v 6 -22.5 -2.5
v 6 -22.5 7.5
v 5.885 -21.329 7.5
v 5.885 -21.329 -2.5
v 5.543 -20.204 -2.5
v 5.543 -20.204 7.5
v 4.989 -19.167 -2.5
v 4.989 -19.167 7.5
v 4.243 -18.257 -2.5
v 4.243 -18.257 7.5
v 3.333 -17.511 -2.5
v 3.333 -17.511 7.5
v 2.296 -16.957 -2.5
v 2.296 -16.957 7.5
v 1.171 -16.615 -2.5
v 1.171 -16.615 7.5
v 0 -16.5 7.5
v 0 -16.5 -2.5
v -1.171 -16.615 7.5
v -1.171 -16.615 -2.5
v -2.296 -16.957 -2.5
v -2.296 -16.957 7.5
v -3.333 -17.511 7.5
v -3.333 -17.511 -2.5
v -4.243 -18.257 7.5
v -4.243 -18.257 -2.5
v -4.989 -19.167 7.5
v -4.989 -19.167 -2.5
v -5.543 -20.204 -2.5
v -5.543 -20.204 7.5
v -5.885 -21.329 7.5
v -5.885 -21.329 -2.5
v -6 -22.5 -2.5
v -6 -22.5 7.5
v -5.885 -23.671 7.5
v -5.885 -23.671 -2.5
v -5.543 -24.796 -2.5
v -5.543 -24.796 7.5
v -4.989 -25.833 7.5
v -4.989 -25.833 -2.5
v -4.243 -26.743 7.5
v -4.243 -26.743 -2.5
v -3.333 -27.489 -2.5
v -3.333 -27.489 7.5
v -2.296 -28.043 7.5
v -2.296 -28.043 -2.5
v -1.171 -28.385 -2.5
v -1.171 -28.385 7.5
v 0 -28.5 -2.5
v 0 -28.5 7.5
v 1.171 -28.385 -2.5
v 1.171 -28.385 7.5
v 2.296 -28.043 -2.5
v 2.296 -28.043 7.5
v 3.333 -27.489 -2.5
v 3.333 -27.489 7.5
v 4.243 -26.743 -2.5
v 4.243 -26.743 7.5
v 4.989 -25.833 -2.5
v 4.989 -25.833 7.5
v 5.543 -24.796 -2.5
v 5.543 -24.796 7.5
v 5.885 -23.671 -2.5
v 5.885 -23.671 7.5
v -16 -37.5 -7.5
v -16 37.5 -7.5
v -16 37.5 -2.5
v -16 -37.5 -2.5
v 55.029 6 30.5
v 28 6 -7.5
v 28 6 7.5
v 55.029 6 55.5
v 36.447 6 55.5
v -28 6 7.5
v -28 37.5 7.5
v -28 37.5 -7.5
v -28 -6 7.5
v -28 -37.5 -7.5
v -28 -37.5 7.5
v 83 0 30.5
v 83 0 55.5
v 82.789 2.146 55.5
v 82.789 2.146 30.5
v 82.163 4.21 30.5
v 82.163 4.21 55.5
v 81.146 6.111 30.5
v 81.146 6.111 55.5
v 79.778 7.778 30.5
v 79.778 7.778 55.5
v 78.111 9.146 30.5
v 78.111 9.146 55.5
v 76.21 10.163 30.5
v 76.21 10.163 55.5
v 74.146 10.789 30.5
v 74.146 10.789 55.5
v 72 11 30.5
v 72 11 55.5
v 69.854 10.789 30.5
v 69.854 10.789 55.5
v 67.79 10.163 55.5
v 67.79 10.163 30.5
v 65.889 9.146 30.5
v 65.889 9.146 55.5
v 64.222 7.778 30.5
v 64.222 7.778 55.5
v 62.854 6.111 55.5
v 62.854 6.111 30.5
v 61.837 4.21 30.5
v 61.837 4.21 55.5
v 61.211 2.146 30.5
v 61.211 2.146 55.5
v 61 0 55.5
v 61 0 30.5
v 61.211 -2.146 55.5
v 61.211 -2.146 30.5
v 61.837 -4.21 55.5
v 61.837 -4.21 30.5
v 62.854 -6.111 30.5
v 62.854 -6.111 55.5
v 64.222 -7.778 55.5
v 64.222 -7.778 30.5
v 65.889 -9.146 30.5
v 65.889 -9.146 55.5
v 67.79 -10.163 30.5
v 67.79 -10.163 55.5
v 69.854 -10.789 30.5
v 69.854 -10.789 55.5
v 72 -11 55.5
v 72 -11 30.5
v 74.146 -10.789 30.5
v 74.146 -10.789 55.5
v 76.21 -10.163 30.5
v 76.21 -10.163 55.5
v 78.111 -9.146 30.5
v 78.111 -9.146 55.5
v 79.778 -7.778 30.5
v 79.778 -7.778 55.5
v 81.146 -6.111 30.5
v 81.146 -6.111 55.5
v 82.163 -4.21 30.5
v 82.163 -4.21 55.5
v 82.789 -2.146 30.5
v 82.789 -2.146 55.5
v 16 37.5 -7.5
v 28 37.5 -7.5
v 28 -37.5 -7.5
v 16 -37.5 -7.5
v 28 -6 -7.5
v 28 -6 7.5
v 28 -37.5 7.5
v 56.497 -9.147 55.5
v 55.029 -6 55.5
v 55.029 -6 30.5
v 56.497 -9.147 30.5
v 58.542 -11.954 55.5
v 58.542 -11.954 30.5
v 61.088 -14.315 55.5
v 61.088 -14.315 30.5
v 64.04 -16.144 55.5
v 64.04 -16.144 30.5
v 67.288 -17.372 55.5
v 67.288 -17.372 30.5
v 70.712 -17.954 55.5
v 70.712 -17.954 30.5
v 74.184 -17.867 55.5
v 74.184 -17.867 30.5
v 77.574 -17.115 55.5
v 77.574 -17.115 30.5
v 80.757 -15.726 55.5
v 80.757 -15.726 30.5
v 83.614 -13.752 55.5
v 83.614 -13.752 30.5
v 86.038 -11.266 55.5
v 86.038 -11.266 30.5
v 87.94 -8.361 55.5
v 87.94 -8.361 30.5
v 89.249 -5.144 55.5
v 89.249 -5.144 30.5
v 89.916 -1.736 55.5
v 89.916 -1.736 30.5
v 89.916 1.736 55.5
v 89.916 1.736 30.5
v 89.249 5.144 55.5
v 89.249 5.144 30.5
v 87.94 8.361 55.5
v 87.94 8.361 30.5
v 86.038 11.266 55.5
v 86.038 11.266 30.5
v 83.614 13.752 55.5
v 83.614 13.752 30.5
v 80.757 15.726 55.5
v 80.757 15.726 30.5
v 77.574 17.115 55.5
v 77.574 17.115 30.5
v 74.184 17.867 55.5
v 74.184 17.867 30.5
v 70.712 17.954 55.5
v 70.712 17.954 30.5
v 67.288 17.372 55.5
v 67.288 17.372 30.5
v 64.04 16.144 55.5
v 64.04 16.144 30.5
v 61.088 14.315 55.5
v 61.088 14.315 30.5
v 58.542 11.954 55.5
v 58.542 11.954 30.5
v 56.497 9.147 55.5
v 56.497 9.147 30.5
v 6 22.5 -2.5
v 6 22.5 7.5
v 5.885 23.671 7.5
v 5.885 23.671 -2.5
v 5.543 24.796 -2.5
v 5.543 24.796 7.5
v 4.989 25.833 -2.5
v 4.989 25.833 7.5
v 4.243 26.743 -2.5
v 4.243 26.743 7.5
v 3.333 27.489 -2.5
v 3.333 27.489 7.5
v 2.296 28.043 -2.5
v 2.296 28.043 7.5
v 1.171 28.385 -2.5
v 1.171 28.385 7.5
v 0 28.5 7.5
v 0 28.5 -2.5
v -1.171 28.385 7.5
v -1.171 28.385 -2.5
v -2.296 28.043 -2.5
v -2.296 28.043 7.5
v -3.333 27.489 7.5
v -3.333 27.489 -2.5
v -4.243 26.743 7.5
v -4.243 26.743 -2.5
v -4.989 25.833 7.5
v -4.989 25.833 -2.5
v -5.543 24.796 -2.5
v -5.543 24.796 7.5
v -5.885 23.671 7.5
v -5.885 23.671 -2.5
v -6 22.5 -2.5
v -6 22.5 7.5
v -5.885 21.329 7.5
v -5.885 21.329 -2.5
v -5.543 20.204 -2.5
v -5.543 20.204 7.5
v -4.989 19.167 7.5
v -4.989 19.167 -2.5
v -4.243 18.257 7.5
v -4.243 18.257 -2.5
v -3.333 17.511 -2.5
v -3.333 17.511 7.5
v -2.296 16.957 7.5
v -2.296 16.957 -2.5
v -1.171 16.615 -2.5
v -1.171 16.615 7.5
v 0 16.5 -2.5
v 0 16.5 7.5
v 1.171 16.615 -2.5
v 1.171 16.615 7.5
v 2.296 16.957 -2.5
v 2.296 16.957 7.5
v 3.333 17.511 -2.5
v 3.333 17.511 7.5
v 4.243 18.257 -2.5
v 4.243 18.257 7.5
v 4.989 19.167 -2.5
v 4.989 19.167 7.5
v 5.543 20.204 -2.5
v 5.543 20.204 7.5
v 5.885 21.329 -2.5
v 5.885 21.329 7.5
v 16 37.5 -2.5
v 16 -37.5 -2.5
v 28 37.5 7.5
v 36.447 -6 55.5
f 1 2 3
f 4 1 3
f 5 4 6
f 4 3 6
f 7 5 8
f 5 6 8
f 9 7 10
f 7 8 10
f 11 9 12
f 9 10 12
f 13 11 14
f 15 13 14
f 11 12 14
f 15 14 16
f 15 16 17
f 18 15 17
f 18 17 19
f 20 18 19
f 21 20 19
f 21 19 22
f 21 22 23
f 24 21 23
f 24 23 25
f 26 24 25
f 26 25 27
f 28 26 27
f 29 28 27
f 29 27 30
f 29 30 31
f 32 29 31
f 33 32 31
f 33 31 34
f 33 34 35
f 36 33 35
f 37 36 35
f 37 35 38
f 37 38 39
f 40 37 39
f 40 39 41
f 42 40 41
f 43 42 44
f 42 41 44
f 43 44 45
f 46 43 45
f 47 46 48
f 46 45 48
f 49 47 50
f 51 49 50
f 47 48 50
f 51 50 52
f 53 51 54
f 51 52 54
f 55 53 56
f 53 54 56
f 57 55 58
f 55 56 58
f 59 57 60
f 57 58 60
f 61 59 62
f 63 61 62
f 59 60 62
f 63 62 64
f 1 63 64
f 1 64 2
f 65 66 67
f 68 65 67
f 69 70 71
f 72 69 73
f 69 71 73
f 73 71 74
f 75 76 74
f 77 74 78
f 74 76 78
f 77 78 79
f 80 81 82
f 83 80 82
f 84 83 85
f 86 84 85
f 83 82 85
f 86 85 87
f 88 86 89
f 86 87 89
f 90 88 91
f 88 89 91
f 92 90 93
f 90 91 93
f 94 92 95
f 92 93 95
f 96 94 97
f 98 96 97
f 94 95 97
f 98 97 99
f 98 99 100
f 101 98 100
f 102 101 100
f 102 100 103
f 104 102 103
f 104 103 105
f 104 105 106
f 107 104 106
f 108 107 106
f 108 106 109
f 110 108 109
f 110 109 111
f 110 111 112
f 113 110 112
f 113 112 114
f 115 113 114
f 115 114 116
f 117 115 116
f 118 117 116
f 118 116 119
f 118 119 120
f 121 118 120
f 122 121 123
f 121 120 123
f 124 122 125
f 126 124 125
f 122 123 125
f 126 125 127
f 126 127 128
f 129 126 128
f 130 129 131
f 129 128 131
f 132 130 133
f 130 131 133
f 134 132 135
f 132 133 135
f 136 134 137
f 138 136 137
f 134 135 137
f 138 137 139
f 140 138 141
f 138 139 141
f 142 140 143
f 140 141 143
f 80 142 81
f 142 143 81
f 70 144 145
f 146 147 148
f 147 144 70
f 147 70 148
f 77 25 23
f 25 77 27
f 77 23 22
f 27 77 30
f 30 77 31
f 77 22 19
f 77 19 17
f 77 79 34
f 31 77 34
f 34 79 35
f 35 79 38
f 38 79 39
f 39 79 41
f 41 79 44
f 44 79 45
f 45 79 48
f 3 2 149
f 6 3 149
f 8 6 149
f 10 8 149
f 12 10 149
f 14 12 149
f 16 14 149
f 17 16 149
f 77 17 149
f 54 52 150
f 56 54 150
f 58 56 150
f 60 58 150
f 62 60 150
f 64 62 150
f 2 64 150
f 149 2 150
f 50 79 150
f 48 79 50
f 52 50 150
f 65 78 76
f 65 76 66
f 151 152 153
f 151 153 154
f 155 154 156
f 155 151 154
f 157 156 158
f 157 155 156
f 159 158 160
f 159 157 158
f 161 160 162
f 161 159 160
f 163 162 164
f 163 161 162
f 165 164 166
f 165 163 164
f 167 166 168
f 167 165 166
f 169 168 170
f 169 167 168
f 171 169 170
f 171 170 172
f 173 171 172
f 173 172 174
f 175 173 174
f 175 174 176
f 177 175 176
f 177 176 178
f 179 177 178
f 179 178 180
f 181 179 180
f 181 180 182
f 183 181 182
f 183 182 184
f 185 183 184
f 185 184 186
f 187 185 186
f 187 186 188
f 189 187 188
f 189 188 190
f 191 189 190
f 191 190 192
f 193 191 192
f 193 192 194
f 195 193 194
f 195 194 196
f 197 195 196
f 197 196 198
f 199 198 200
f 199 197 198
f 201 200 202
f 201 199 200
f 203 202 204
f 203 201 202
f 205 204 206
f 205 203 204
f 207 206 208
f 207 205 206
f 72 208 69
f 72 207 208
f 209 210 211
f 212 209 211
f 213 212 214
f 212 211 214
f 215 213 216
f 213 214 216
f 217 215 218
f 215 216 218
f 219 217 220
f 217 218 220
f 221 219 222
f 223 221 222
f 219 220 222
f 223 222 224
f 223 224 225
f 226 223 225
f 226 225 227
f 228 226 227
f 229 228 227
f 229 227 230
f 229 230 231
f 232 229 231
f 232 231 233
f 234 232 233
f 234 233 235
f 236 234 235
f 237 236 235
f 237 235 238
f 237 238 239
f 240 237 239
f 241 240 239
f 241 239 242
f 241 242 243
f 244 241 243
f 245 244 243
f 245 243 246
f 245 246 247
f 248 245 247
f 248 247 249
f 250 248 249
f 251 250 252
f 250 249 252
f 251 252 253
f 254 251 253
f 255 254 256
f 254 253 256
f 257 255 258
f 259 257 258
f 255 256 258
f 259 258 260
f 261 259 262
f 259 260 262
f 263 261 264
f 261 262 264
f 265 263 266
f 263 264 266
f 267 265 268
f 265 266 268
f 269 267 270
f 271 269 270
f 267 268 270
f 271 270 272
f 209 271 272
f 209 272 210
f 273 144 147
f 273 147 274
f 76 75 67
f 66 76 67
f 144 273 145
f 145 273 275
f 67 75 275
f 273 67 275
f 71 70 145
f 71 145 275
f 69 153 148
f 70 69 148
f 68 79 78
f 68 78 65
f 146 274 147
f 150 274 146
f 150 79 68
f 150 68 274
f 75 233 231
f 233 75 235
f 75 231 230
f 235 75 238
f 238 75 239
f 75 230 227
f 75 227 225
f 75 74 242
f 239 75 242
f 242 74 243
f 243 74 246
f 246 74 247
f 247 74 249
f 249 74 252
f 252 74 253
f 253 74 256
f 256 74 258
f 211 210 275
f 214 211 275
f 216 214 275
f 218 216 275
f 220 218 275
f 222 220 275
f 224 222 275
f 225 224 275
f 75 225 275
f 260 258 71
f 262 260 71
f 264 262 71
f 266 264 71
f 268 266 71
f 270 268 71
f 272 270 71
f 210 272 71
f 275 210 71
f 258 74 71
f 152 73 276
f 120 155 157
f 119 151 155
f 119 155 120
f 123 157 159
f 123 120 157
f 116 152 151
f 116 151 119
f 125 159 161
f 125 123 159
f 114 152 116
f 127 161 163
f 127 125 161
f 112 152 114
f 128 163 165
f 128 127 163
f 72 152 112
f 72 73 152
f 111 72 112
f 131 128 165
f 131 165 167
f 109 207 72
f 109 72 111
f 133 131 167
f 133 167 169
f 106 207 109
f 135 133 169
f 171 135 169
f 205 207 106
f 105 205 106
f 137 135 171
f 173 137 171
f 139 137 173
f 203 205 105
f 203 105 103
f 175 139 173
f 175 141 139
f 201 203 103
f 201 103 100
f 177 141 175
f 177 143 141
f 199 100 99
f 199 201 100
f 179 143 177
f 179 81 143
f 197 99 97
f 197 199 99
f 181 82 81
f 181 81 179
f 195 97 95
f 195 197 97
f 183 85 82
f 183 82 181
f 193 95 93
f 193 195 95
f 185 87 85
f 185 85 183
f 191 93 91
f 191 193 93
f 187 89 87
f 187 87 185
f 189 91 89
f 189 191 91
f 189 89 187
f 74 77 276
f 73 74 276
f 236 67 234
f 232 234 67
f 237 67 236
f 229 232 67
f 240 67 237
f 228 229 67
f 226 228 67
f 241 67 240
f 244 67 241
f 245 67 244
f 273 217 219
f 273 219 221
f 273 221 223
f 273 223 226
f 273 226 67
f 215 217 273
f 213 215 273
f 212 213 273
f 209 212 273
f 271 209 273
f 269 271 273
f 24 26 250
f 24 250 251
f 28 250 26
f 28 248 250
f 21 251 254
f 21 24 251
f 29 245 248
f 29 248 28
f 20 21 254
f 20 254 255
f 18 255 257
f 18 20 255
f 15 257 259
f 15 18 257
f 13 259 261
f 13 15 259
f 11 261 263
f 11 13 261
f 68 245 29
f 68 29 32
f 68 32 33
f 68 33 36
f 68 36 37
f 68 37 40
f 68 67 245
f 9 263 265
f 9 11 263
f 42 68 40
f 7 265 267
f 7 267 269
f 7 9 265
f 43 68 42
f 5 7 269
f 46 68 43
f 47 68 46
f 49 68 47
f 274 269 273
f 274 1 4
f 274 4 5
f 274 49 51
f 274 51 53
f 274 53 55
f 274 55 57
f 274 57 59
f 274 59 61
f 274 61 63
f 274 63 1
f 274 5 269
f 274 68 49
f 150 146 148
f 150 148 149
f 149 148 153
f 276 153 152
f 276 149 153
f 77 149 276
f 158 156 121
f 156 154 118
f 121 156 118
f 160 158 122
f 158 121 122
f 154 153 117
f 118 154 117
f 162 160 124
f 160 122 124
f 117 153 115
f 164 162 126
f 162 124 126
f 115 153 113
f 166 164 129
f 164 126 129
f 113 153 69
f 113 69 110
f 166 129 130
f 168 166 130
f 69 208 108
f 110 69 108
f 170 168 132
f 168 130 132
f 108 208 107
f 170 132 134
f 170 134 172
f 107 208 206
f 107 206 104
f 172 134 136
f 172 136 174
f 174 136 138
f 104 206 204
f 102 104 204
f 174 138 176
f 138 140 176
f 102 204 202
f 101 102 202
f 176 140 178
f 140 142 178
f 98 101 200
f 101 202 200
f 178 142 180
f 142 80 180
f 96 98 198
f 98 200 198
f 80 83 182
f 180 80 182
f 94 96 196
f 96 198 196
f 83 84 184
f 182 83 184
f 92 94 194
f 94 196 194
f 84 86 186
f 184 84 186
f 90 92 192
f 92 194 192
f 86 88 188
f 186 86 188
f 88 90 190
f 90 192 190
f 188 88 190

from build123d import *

# Parameters (mm, degrees)
F0_W      = 56
F0_H      = 15
F1_DEPTH  = 37.5
F3_W      = 12
F3_H      = 63
F4_DEPTH  = 100
F6_DEPTH  = 43.501
F7_R      = 18
F8_DEPTH  = 25
F10_DEPTH = 43.501
F11_R     = 11
F12_DEPTH = 63.001
F2_W      = 32
F2_H      = 5
F13_DEPTH = 75.001
F14_R     = 6
F15_DEPTH = 15.001


with BuildPart() as f1:
    # F0 (on Front) → F1 (new body, symmetric)
    with BuildSketch(Plane.XZ):
        Rectangle(F0_W, F0_H)
    extrude(amount=F1_DEPTH, both=True)

    # F3 (on face) → F4 (join)
    with BuildSketch(Plane(origin=(-28, 0, 0), x_dir=(0, -1, 0), z_dir=(-1, 0, 0))):
        with Locations((0, 24)):
            Rectangle(F3_W, F3_H)
    extrude(amount=-F4_DEPTH)

    # F5 (on face) → F6 (cut, through all)
    with BuildSketch(Plane.XZ.offset(6)):
        Polygon((-28, 55.5), (-28, 7.5), (36.446944, 55.5), align=None)
    extrude(amount=-F6_DEPTH, mode=Mode.SUBTRACT)

    # F7 (on face) → F8 (join)
    with BuildSketch(Plane.XY.offset(55.5)):
        with Locations((72, 0)):
            Circle(F7_R)
    extrude(amount=-F8_DEPTH)

    # F9 (on face) → F10 (cut, through all)
    with BuildSketch(Plane.XZ.offset(6)):
        Polygon((55.029437, 30.5), (28, -7.5), (72, -7.5), (72, 30.5), align=None)
    extrude(amount=-F10_DEPTH, mode=Mode.SUBTRACT)

    # F11 (on face) → F12 (cut, through all)
    with BuildSketch(Plane.XY.offset(55.5)):
        with Locations((72, 0)):
            Circle(F11_R)
    extrude(amount=-F12_DEPTH, mode=Mode.SUBTRACT)

    # F2 (on face) → F13 (cut, through all)
    with BuildSketch(Plane.XZ.offset(37.5)):
        with Locations((0, -5)):
            Rectangle(F2_W, F2_H)
    extrude(amount=-F13_DEPTH, mode=Mode.SUBTRACT)

    # F14 (on face) → F15 (cut, through all)
    with BuildSketch(Plane.XY.offset(7.5)):
        with Locations((0, 22.5)):
            Circle(F14_R)
        with Locations((0, -22.5)):
            Circle(F14_R)
    extrude(amount=-F15_DEPTH, mode=Mode.SUBTRACT)


solid = f1.part
